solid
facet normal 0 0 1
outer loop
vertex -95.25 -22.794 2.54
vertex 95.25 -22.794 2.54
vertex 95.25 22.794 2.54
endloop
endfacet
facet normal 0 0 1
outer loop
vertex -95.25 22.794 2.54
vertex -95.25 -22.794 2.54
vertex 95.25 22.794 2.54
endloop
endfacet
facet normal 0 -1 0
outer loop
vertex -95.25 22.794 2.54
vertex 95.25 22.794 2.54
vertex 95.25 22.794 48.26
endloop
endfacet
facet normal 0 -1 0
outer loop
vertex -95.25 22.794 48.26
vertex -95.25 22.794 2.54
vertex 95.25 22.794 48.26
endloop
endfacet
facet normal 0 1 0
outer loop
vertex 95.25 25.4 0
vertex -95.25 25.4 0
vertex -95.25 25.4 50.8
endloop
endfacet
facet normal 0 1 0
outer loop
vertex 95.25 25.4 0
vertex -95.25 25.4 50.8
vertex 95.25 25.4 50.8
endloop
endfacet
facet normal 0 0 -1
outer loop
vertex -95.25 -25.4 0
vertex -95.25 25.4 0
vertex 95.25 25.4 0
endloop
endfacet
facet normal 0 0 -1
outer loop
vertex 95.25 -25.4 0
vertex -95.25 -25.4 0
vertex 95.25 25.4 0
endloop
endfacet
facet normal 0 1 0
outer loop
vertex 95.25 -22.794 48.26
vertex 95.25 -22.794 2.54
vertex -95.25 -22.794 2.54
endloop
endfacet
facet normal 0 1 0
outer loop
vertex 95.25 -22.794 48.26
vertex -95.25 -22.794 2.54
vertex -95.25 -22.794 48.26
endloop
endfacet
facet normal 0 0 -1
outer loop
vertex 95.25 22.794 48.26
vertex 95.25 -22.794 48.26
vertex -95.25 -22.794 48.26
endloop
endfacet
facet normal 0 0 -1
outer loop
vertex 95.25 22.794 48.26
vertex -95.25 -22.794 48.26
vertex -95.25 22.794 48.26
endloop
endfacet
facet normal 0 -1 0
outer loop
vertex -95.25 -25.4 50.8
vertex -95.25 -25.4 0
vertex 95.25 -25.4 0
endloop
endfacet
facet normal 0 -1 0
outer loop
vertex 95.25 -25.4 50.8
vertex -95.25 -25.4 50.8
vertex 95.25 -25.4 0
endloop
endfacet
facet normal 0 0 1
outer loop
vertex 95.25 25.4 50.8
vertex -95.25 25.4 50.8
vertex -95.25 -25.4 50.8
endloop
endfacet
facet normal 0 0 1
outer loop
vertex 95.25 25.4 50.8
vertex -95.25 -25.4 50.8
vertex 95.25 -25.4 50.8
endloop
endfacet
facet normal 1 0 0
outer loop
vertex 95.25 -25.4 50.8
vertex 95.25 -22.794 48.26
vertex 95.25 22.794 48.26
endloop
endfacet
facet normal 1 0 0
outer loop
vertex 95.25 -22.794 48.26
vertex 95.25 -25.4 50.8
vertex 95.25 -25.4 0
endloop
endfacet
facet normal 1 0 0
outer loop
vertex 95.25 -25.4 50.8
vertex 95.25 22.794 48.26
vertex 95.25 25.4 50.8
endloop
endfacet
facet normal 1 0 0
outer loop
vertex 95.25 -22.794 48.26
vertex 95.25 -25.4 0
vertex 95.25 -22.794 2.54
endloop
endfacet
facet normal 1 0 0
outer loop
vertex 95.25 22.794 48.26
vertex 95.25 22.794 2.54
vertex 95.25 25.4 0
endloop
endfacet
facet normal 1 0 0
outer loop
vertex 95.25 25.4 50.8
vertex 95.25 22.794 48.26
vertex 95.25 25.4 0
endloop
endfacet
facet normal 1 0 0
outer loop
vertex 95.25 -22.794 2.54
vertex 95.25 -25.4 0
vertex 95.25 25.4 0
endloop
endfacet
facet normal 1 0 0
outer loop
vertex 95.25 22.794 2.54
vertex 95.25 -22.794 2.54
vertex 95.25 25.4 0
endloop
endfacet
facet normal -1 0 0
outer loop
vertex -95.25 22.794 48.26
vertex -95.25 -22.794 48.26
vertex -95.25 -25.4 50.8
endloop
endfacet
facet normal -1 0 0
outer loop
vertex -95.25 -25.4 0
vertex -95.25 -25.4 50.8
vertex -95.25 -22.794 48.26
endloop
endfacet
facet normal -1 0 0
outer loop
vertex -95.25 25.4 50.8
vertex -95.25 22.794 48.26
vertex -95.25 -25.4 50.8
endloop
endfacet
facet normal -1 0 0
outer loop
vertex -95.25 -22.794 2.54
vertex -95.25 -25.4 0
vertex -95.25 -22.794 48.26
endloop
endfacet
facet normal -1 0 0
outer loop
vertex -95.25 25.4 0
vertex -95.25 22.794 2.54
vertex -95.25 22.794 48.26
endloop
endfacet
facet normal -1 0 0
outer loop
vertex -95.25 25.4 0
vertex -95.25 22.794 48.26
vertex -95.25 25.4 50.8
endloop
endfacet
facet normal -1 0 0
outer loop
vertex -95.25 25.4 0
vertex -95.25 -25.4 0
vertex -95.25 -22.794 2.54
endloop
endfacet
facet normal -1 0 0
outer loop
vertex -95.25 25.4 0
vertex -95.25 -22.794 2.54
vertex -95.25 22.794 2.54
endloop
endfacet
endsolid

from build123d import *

# Parameters (mm, degrees)
F0_W     = 190.5
F0_H     = 50.8
F1_DEPTH = 50.8
F2_W     = 45.588648
F2_H     = 45.72
F3_DEPTH = 237.56619


with BuildPart() as f1:
    # F0 (on Top) → F1 (new body)
    with BuildSketch(Plane.XY):
        Rectangle(F0_W, F0_H)
    extrude(amount=F1_DEPTH)

    # F2 (on face) → F3 (cut)
    with BuildSketch(Plane.YZ.offset(95.25)):
        with Locations((0, 25.4)):
            Rectangle(F2_W, F2_H)
    extrude(amount=-F3_DEPTH, mode=Mode.SUBTRACT)


solid = f1.part
